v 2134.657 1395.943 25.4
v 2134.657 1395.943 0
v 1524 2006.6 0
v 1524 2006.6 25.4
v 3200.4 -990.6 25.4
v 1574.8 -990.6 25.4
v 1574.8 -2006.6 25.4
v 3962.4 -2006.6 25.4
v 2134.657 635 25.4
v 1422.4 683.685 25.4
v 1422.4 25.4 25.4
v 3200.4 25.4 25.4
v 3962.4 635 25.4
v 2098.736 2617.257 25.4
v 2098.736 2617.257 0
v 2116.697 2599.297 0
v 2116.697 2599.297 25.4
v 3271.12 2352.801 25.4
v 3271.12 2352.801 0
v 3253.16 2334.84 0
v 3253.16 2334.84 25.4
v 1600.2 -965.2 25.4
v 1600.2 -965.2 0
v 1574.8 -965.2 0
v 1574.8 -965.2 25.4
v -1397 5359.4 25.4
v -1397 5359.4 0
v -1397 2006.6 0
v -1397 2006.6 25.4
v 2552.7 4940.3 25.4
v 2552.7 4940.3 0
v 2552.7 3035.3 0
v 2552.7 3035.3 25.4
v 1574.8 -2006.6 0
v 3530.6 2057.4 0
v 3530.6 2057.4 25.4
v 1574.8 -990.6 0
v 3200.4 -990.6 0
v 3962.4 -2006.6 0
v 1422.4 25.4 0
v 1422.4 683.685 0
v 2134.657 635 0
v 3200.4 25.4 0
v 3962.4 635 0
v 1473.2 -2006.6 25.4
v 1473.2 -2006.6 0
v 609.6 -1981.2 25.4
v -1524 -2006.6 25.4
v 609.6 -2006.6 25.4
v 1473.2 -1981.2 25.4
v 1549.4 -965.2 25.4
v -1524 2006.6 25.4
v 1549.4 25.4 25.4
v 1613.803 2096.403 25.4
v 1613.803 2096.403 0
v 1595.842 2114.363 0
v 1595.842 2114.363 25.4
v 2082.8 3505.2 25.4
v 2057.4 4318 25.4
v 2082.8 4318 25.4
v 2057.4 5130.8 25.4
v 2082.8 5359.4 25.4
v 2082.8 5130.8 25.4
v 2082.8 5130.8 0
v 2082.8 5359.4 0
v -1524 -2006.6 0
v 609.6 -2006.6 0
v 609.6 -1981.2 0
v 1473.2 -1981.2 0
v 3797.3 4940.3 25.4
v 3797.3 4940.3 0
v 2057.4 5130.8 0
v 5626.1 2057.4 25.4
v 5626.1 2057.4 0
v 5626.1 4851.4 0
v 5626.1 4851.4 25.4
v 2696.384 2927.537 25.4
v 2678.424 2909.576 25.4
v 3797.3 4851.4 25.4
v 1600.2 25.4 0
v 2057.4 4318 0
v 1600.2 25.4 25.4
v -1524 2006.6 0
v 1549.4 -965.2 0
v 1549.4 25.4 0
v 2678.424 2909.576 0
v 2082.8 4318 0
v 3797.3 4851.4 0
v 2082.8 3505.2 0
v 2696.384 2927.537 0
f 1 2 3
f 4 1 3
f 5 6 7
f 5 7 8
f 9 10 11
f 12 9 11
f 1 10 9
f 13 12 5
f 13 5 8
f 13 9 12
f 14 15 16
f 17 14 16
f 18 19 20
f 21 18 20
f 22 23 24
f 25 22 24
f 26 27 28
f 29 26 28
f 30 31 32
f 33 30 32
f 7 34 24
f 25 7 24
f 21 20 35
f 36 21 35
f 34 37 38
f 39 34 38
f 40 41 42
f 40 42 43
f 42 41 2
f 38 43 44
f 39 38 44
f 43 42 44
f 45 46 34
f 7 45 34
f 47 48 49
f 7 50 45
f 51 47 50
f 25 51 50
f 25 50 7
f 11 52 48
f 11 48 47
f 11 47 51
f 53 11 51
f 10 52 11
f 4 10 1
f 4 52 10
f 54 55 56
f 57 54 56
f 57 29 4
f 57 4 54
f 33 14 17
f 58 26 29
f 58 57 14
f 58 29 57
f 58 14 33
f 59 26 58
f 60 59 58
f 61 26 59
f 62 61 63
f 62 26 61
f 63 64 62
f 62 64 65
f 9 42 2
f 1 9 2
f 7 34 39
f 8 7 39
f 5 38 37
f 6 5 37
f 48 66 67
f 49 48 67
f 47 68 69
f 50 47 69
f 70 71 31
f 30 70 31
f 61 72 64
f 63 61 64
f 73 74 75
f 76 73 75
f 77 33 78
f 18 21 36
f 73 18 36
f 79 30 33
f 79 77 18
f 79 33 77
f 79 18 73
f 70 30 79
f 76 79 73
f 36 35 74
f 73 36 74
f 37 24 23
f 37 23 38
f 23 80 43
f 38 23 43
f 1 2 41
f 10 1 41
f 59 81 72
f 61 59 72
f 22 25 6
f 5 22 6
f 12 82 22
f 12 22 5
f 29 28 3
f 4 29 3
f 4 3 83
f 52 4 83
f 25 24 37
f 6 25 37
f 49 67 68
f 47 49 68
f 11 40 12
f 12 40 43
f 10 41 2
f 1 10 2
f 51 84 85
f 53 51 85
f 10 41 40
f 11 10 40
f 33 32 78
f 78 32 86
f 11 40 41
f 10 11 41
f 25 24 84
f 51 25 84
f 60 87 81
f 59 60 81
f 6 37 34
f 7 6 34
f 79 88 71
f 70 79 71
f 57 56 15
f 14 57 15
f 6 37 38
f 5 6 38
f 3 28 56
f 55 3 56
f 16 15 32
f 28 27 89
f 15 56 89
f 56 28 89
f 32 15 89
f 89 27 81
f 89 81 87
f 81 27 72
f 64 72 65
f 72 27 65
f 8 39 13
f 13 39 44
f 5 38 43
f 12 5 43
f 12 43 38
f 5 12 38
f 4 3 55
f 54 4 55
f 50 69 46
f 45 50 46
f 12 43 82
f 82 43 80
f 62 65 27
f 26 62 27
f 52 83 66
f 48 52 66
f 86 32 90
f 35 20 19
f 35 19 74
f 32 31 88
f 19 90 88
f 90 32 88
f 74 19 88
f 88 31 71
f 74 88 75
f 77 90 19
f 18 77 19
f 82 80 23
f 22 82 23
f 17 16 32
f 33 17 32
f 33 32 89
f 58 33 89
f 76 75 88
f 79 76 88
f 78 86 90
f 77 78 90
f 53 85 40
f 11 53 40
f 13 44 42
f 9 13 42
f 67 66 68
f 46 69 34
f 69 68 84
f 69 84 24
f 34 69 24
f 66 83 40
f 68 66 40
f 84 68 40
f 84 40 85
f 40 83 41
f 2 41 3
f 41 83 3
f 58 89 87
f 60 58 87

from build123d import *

# Parameters (mm, degrees)
F1_DEPTH = 25.4
F2_DEPTH = 25.4
F3_DEPTH = 25.4
F4_DEPTH = 25.4
F5_DEPTH = 25.4


with BuildPart() as f1:
    # F0 (on Top) → F1 (new body)
    with BuildSketch(Plane.XY):
        Polygon((-1397, 2006.6), (-1524, 2006.6), (-1524, -2006.6), (609.6, -2006.6), (609.6, -1981.2), (1473.2, -1981.2), (1473.2, -2006.6), (1574.8, -2006.6), (1574.8, -990.6), (1574.8, -965.2), (1549.4, -965.2), (1549.4, 25.4), (1422.4, 25.4), (1422.4, 683.685168), (2134.657416, 1395.942584), (1524, 2006.6), align=None)
    extrude(amount=F1_DEPTH)


with BuildPart() as f2:
    # F0 (on Top) → F2 (new body)
    with BuildSketch(Plane.XY):
        Polygon((1574.8, -965.2), (1574.8, -990.6), (2692.4, -990.6), (3200.4, -990.6), (3200.4, 25.4), (1600.2, 25.4), (1600.2, -965.2), align=None)
    extrude(amount=F2_DEPTH)


with BuildPart() as f3:
    # F0 (on Top) → F3 (new body)
    with BuildSketch(Plane.XY):
        Polygon((2134.657416, 635), (2134.657416, 1395.942584), (1422.4, 683.685168), (1422.4, 25.4), (1549.4, 25.4), (1600.2, 25.4), (3200.4, 25.4), (3200.4, -990.6), (2692.4, -990.6), (1574.8, -990.6), (1574.8, -2006.6), (2692.4, -2006.6), (3962.4, -2006.6), (3962.4, 635), align=None)
    extrude(amount=F3_DEPTH)


with BuildPart() as f4:
    # F0 (on Top) → F4 (new body)
    with BuildSketch(Plane.XY):
        Polygon((-1397, 5359.4), (-1397, 2006.6), (1524, 2006.6), (1613.802561, 2096.402561), (1595.842049, 2114.363073), (2098.736392, 2617.257416), (2116.696904, 2599.296904), (2552.7, 3035.3), (2082.8, 3505.2), (2082.8, 4318), (2057.4, 4318), (2057.4, 5130.8), (2082.8, 5130.8), (2082.8, 5359.4), align=None)
    extrude(amount=F4_DEPTH)


with BuildPart() as f5:
    # F0 (on Top) → F5 (new body)
    with BuildSketch(Plane.XY):
        Polygon((3797.3, 4940.3), (2552.7, 4940.3), (2552.7, 3035.3), (2678.423586, 2909.576414), (2696.384098, 2927.536927), (3271.12049, 2352.800535), (3253.159977, 2334.840023), (3530.6, 2057.4), (5626.1, 2057.4), (5626.1, 4851.4), (3797.3, 4851.4), align=None)
    extrude(amount=F5_DEPTH)


solid = Compound([f1.part, f2.part, f3.part, f4.part, f5.part])
